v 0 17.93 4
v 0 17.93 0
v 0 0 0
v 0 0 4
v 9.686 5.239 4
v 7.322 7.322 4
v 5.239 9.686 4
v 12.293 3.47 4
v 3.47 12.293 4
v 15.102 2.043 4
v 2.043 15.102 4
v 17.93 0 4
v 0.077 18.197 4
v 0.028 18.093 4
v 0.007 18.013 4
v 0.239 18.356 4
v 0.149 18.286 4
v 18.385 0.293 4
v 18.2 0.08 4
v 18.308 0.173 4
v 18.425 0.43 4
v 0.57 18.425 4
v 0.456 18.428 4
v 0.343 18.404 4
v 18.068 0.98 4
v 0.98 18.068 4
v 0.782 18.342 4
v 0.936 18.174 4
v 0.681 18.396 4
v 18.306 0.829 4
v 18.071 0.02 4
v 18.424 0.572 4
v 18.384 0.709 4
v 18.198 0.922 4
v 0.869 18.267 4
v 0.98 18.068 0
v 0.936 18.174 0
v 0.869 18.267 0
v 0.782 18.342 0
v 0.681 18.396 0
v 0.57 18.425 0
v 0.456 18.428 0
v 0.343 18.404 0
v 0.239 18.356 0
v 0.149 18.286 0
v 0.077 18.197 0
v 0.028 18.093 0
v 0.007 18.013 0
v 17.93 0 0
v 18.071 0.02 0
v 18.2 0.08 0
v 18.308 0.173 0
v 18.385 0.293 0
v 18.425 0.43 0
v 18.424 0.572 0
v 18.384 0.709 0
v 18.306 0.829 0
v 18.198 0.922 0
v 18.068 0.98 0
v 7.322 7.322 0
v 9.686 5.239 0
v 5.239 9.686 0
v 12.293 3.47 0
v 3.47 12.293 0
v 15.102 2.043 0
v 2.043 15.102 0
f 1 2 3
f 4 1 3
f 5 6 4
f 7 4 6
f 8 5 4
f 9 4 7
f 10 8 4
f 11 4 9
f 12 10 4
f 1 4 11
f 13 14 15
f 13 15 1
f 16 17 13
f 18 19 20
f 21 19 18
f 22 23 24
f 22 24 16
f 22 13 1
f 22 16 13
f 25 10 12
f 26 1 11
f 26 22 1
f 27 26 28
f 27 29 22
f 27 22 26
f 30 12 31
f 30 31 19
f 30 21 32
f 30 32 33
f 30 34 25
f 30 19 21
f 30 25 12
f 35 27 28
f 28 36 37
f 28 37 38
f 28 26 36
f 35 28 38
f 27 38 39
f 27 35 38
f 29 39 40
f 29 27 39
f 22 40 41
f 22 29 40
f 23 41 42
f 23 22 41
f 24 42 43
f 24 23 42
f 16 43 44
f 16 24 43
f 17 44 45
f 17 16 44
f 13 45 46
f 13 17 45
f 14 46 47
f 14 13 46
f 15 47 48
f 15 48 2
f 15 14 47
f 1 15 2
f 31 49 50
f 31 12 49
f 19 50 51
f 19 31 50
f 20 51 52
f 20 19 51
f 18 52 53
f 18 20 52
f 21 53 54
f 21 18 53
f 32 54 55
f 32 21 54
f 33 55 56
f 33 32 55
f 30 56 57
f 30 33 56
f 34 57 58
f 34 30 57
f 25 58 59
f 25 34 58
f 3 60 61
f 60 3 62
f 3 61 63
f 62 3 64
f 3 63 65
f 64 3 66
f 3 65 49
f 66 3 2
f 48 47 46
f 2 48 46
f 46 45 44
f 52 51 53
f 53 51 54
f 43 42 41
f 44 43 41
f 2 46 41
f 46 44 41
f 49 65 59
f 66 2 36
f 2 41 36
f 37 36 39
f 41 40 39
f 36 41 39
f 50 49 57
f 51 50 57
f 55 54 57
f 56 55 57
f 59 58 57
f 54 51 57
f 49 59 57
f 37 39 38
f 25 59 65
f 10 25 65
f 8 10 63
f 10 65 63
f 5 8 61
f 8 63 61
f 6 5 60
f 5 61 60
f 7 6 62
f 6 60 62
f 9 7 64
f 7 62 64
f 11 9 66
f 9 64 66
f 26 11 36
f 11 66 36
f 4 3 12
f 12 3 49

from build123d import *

# Parameters (mm, degrees)
AUFSATZ_LINEAR_AUSTRAGEN1_DEPTH = 4
VERRUNDUNG1_R                   = 0.5


with BuildPart() as part:
    # Skizze1 → Aufsatz-Linear austragen1 (new body)
    with BuildSketch(Plane.XY):
        with BuildLine():
            Line((0, 0), (25, 1.53e-15))
            ThreePointArc((25, 1.53e-15), (7.322330470336308, 7.322330470336315), (0, 25))
            Line((0, 25), (0, 0))
        make_face()
    extrude(amount=AUFSATZ_LINEAR_AUSTRAGEN1_DEPTH)

    # Verrundung1
    verrundung1_edges = [part.edges().sort_by_distance(p)[0] for p in [
        (0, 25, 2),
        (25, -1.01e-15, 2),
    ]]
    fillet(verrundung1_edges, radius=VERRUNDUNG1_R - 0.0001)  # a hair under: the kernel refuses the full size


solid = part.part
